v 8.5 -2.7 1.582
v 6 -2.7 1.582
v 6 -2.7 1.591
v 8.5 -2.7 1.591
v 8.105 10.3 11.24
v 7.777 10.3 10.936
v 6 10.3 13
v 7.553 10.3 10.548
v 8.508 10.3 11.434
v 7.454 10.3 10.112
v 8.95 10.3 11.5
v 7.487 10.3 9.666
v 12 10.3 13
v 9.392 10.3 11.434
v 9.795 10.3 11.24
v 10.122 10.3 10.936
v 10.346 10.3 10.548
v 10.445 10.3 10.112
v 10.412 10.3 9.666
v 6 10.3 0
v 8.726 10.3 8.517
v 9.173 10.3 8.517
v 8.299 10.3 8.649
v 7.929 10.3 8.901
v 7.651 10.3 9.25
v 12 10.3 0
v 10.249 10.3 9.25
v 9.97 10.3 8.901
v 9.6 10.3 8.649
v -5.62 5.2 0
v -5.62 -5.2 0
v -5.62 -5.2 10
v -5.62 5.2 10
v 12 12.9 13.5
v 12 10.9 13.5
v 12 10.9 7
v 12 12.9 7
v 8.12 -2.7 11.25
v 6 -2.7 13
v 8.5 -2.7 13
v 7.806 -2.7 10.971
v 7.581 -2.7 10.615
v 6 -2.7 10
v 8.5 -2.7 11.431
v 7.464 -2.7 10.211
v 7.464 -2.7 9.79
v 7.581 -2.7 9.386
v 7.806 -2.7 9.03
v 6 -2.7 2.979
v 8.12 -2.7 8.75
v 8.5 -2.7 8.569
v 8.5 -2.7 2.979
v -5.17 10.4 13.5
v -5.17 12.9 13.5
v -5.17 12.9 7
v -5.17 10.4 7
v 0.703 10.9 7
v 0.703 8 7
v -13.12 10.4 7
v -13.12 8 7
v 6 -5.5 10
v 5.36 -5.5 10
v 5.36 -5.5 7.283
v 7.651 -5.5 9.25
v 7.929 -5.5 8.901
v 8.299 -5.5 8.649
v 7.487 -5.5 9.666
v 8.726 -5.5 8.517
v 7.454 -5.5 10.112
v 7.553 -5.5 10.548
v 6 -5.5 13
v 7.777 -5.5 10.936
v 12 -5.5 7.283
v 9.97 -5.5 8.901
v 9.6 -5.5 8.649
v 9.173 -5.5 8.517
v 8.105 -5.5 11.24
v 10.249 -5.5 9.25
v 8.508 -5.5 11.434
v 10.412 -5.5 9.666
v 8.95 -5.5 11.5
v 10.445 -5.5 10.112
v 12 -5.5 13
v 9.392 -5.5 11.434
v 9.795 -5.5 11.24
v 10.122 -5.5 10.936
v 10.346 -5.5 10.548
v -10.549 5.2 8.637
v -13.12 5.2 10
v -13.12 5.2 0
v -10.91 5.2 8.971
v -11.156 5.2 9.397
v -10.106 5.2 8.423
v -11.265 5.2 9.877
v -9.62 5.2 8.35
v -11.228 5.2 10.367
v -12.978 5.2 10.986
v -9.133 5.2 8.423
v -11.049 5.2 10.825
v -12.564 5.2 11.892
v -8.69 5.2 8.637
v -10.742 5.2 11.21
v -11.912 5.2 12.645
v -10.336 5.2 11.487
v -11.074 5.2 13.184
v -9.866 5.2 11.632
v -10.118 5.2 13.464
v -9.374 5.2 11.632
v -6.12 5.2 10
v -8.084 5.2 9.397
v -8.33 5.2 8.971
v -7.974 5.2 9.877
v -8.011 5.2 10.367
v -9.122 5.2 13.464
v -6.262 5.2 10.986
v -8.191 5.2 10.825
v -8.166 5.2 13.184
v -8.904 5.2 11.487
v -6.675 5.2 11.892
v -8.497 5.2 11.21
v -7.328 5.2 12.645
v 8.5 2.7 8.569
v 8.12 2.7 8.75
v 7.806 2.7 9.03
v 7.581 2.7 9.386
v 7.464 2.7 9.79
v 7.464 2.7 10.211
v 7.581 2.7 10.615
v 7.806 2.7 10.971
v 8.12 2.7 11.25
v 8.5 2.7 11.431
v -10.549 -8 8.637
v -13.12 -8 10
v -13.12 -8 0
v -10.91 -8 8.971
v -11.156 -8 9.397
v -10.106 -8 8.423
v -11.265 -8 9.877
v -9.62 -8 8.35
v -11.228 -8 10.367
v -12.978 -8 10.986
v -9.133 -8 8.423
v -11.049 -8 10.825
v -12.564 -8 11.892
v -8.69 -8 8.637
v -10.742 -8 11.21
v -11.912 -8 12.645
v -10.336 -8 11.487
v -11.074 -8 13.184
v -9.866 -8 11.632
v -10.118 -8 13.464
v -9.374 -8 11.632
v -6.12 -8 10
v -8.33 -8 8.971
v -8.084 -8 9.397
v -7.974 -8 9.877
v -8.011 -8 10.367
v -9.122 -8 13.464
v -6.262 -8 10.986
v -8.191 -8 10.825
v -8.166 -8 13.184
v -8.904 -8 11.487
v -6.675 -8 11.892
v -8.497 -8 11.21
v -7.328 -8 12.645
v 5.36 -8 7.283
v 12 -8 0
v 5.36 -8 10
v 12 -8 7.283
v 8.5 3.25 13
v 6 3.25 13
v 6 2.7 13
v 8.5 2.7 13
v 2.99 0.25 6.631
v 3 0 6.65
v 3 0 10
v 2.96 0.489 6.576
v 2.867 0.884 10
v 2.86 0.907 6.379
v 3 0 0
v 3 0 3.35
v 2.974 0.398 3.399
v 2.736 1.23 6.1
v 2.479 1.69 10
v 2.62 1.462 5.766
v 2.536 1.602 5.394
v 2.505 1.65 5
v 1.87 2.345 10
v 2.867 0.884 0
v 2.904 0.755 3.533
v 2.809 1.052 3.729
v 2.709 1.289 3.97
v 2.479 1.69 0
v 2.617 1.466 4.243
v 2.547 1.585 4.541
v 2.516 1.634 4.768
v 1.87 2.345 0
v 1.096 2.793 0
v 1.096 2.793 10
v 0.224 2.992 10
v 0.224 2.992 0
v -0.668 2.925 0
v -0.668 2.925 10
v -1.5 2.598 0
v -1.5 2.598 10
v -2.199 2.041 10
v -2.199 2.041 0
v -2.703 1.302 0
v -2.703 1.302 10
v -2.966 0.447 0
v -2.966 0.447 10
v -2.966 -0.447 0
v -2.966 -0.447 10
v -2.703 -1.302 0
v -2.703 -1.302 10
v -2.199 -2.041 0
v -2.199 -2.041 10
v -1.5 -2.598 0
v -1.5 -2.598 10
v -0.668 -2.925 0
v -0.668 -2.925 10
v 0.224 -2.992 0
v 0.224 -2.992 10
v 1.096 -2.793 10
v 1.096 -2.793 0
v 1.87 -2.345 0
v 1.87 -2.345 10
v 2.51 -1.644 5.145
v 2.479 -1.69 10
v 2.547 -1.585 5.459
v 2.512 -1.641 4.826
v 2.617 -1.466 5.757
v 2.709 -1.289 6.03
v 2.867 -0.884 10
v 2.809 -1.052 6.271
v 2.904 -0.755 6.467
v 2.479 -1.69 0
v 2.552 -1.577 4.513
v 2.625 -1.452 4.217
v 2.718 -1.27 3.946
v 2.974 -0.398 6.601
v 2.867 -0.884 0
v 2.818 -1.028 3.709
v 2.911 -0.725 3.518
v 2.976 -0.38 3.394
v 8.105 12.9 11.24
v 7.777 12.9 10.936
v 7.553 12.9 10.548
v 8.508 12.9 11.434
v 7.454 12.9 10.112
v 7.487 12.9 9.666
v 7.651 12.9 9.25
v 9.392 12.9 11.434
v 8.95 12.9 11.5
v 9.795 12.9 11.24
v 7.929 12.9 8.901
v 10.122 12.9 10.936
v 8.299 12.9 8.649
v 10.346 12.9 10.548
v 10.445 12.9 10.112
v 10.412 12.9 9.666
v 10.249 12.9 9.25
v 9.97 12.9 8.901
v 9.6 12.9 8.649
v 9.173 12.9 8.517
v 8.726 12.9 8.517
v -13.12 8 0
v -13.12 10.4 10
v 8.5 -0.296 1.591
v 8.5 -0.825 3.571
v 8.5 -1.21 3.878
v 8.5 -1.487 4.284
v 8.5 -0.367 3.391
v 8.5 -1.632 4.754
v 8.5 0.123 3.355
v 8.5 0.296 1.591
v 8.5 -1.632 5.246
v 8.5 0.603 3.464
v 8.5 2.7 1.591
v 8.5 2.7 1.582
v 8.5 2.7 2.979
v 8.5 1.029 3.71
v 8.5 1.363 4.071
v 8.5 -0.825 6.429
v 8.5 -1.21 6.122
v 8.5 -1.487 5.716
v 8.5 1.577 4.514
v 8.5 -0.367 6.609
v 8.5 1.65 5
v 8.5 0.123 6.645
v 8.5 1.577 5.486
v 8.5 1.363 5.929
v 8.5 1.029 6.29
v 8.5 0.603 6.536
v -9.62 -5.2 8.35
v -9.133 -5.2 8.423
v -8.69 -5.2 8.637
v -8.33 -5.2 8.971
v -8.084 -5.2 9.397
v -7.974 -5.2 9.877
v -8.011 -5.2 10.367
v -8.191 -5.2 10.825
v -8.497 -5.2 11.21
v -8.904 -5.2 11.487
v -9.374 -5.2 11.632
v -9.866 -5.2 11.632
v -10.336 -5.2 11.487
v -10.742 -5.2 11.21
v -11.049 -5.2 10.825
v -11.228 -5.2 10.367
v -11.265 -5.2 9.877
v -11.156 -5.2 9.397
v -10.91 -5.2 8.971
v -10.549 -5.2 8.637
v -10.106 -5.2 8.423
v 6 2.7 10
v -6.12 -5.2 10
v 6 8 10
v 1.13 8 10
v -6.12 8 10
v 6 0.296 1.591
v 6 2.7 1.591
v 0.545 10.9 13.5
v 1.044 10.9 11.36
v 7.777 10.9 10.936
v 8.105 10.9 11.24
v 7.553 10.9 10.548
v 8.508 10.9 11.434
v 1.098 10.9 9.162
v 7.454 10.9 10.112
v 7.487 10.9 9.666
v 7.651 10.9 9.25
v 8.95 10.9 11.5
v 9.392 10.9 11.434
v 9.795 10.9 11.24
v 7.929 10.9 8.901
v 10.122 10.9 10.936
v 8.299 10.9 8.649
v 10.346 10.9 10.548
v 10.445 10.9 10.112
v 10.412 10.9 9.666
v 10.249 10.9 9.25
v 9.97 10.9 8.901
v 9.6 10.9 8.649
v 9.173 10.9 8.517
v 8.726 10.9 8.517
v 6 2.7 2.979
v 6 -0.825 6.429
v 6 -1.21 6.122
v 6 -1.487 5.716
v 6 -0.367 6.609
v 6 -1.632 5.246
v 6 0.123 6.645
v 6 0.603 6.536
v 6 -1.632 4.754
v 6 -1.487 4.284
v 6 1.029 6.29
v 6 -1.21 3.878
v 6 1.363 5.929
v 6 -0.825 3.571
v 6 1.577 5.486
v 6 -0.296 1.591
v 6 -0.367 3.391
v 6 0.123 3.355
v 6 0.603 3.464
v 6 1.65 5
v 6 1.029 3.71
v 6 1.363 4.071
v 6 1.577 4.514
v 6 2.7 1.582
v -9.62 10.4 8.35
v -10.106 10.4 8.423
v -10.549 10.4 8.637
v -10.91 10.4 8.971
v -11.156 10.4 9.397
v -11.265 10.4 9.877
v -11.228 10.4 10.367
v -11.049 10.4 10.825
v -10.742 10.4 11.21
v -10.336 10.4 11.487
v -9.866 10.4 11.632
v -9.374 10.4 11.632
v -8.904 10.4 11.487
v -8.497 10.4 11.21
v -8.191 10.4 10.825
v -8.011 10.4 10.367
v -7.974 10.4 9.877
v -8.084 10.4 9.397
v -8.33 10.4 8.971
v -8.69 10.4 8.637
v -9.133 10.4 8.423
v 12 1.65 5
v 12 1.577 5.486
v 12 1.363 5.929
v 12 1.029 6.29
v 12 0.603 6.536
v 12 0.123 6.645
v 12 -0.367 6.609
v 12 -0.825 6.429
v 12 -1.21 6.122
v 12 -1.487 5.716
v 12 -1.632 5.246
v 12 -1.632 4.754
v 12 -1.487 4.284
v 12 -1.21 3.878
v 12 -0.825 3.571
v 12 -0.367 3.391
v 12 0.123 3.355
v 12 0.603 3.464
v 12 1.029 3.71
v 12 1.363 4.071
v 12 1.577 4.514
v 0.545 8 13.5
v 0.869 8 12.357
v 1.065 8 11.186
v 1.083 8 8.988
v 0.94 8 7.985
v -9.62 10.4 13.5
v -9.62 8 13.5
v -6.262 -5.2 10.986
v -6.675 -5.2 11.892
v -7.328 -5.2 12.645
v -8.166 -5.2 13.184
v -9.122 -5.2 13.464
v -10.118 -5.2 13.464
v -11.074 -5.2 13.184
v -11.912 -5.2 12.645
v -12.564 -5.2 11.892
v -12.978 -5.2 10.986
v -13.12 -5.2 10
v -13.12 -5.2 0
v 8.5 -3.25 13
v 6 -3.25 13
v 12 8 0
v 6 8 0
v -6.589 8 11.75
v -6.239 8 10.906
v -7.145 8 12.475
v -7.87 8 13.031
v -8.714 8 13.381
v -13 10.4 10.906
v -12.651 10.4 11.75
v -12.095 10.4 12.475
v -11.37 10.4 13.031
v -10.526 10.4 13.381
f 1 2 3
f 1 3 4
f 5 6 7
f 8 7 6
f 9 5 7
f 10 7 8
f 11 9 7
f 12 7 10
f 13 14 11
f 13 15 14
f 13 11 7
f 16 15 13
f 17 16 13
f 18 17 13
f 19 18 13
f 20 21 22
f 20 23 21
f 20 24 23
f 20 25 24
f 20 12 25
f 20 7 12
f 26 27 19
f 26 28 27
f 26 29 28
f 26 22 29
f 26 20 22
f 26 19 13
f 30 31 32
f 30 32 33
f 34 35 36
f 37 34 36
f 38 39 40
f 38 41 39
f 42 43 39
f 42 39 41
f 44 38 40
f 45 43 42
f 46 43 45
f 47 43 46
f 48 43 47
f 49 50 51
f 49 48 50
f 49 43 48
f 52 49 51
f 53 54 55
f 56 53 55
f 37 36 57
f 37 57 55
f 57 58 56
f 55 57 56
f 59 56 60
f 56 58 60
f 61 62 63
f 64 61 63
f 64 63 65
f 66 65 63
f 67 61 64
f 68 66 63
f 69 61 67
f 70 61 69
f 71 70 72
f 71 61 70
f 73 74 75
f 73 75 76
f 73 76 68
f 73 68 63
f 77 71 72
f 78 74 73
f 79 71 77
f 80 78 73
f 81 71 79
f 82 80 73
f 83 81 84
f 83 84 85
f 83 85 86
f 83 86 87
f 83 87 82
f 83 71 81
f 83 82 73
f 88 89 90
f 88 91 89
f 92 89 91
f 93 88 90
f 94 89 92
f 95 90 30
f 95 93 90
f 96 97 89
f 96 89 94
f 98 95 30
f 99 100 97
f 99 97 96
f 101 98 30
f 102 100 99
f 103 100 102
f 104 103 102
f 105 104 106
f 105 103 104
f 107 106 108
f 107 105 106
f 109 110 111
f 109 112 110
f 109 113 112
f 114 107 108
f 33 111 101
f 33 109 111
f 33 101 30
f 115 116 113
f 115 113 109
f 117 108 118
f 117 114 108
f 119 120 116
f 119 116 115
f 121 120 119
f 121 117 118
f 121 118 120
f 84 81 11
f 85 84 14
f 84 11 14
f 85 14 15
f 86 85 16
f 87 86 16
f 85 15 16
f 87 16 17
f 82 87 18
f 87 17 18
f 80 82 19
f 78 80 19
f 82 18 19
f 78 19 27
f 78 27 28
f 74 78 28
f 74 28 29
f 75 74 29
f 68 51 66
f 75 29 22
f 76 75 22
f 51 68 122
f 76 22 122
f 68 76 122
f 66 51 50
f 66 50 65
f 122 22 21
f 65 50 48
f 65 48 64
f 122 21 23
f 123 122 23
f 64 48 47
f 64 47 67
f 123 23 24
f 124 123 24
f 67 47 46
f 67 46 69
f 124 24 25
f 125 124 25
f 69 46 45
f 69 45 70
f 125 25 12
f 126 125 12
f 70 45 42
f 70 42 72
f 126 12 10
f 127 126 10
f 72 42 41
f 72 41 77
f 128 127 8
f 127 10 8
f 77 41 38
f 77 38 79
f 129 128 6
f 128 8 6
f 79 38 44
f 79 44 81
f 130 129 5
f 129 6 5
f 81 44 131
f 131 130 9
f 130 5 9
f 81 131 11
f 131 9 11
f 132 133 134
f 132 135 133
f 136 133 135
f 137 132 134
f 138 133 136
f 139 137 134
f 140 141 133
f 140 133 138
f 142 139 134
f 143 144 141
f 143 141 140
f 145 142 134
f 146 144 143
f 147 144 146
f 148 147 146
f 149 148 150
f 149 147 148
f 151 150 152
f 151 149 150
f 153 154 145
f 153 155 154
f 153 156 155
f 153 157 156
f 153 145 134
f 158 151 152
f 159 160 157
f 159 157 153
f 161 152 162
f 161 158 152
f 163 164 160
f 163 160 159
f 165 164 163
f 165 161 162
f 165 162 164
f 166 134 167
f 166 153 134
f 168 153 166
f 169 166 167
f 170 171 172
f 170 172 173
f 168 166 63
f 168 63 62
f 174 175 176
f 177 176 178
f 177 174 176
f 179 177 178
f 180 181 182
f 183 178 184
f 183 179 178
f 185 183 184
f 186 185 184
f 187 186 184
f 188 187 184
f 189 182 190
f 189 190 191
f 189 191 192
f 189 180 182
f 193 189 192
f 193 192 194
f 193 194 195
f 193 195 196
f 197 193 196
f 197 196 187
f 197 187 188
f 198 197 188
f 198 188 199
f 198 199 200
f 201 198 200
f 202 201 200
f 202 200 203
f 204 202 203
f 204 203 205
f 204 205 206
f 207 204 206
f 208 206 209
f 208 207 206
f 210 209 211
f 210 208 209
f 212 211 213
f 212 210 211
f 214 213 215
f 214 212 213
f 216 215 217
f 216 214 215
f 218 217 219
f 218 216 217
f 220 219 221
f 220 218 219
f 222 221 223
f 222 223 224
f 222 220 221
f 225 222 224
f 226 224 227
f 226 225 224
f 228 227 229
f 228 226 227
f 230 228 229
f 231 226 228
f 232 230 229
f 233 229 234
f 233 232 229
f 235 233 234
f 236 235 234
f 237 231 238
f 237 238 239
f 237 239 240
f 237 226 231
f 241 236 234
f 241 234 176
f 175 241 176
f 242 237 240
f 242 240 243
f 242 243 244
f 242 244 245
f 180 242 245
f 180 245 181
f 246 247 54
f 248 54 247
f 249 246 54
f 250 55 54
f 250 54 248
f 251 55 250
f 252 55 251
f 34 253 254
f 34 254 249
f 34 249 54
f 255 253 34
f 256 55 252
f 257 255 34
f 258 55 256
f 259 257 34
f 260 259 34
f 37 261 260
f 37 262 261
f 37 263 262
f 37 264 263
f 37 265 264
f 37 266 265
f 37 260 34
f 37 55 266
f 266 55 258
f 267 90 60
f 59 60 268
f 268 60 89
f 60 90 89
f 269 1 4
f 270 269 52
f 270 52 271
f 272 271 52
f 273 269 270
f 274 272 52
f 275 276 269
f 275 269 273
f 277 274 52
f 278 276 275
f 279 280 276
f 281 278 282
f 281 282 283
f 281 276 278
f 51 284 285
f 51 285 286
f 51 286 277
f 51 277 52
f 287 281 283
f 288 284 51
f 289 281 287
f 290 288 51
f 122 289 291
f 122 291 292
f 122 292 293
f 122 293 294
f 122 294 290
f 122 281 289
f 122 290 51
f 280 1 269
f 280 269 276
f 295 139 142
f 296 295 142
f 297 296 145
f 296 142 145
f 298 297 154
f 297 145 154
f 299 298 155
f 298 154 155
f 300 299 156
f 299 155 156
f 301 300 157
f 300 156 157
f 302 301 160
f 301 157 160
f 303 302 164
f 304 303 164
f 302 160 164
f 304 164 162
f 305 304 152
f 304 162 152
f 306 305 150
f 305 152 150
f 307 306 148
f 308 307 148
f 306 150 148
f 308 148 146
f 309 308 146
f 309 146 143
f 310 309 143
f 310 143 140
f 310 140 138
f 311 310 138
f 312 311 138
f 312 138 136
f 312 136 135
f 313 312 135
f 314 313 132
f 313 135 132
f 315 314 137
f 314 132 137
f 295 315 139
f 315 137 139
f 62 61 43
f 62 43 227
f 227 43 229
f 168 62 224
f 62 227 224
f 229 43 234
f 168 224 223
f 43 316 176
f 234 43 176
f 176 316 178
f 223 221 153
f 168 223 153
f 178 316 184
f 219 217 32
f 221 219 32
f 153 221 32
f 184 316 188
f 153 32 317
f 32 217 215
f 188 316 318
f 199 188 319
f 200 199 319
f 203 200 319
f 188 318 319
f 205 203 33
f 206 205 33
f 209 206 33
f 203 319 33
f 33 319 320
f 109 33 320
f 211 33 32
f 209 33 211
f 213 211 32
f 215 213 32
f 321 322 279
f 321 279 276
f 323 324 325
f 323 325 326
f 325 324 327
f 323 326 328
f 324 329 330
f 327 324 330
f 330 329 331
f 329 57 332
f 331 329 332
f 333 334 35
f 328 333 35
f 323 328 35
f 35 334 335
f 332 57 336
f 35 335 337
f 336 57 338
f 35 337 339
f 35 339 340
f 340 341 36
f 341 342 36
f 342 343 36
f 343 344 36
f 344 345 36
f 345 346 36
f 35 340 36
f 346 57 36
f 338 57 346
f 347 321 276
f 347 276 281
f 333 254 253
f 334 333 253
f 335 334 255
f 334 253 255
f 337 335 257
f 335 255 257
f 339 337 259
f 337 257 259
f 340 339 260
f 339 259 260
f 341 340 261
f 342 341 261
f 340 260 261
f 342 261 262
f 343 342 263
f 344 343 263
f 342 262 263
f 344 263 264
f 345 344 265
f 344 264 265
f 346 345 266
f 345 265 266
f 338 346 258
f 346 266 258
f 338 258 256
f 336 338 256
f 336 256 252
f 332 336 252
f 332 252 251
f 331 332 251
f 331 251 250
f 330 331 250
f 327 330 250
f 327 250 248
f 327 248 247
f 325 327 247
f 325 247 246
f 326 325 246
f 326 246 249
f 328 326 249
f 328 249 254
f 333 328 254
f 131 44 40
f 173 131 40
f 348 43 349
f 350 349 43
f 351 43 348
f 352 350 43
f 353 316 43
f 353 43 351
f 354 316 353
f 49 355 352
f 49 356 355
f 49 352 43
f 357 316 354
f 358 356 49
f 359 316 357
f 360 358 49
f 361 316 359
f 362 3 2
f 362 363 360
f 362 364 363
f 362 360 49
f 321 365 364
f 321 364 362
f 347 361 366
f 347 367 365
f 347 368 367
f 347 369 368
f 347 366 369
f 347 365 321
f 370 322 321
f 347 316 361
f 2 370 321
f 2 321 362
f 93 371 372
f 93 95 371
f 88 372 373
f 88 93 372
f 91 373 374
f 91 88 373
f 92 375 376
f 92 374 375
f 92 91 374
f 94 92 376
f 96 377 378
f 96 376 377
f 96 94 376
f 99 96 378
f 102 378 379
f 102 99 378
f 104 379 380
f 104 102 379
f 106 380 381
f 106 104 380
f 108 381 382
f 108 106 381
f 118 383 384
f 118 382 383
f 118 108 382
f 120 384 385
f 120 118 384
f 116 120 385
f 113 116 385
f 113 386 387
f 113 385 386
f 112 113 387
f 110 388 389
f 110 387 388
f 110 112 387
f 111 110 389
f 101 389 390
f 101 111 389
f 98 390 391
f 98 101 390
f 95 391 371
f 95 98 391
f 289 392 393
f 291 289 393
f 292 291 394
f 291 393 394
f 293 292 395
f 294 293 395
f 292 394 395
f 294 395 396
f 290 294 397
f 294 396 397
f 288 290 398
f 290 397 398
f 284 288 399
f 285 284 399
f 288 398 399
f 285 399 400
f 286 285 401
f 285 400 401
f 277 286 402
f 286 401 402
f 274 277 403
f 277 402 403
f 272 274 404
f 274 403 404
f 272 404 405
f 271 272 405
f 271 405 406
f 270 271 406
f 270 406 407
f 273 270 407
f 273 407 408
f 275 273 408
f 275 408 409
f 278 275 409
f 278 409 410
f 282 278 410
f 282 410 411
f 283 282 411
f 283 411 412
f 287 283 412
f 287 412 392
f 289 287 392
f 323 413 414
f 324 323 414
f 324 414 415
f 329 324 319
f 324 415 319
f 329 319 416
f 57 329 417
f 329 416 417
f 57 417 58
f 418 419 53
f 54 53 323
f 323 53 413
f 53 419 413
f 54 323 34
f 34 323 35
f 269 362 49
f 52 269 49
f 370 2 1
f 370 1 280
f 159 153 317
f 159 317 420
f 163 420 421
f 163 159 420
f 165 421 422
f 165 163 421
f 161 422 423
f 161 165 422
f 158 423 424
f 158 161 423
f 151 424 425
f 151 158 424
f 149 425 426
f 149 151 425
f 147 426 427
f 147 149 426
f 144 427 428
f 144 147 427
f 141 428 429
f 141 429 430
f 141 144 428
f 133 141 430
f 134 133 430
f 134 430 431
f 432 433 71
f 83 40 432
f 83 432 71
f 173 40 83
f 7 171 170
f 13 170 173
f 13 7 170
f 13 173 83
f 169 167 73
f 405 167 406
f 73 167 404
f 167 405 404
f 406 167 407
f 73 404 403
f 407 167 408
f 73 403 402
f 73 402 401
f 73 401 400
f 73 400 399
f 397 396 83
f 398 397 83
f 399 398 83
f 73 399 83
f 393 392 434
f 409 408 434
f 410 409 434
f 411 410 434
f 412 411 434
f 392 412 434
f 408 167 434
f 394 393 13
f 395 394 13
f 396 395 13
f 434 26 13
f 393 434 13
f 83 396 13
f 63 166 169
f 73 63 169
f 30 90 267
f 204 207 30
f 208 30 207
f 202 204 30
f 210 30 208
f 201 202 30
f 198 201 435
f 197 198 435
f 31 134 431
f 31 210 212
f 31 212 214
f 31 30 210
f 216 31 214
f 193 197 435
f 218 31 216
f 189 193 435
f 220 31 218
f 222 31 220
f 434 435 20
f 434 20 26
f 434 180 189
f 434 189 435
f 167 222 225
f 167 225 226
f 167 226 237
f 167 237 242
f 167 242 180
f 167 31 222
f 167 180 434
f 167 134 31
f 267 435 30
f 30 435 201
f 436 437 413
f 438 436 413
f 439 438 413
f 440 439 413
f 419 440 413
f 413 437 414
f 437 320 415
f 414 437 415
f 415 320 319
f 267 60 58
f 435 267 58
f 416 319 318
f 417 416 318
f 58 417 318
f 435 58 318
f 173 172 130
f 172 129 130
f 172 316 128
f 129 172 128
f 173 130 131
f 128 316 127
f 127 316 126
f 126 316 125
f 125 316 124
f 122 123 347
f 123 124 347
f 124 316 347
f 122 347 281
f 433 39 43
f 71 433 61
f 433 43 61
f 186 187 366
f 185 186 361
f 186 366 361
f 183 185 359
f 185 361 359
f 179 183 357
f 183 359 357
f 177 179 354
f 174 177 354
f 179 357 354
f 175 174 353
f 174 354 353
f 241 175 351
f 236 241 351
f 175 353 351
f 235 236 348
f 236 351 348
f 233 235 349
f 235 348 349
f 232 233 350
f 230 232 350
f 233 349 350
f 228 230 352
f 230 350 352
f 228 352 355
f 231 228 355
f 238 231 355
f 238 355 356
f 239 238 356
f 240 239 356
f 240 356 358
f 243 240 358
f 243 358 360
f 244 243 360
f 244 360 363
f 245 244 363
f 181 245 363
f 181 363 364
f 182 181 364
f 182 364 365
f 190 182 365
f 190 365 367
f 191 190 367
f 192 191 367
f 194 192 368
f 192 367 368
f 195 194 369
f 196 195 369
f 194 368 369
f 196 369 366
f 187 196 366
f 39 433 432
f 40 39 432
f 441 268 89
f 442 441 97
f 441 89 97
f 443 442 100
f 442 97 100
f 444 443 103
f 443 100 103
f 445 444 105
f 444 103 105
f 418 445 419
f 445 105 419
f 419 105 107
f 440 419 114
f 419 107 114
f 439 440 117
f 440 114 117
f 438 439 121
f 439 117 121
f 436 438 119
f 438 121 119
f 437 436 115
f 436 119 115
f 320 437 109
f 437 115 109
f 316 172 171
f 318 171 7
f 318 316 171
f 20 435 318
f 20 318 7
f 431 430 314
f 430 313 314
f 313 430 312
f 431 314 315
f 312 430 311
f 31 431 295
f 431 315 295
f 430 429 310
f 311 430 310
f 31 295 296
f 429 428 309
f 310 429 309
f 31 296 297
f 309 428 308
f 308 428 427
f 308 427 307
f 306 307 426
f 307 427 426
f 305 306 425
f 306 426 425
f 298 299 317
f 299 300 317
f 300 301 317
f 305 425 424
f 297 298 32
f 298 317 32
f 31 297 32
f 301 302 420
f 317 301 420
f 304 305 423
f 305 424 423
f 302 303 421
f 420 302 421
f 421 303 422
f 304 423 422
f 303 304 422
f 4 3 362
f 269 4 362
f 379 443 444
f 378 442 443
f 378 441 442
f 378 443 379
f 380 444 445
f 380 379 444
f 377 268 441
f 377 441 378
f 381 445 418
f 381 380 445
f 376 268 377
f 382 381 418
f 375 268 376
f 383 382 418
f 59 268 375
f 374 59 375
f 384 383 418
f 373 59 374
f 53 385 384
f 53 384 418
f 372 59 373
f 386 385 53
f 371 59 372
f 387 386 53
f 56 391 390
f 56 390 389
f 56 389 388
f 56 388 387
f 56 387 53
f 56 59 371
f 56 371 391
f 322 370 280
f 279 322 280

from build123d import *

# Parameters (mm, degrees)
SZKIC2_W                     = 17.619731325
SZKIC2_H                     = 16
SZKIC2_R                     = 3
DODANIE_WYCI_GNI_CIE1_DEPTH  = 10
SZKIC3_R                     = 1.65
WYTNIJ_WYCI_GNI_CIE1_DEPTH   = 10
WYTNIJ_WYCI_GNI_CIE2_DEPTH   = 2.5
DODANIE_WYCI_GNI_CIE2_DEPTH  = 2.5
SZKIC7_R                     = 1.65
DODANIE_WYCI_GNI_CIE4_DEPTH  = 2.8
SZKIC10_R                    = 1.65
DODANIE_WYCI_GNI_CIE5_DEPTH  = 2.9
SZKIC11_R                    = 1.65
DODANIE_WYCI_GNI_CIE6_DEPTH  = 2
SZKIC12_W                    = 6
SZKIC12_H                    = 13
DODANIE_WYCI_GNI_CIE7_DEPTH  = 2.3
SZKIC16_W                    = 6
SZKIC16_H                    = 3
DODANIE_WYCI_GNI_CIE12_DEPTH = 4.75
SZKIC17_W                    = 3.5
SZKIC17_H                    = 3
DODANIE_WYCI_GNI_CIE13_DEPTH = 6.5
SZKIC18_W                    = 6
SZKIC18_H                    = 3.354251662
DODANIE_WYCI_GNI_CIE14_DEPTH = 4.75
WYTNIJ_WYCI_GNI_CIE3_REACH   = 30.128
SZKIC19_R                    = 1.181229449
SZKIC21_W                    = 2.5
SZKIC21_H                    = 0.556642191
DODANIE_WYCI_GNI_CIE15_DEPTH = 11.418457
WYTNIJ_WYCI_GNI_CIE4_START   = -18.3
SZKIC22_R                    = 1.181229449
WYTNIJ_WYCI_GNI_CIE4_DEPTH   = 18.3
SZKIC34_W                    = 7.949380073
SZKIC34_H                    = 6.5
WYTNIJ_WYCI_GNI_CIE5_DEPTH   = 2.5
SZKIC35_W                    = 6.6400164
SZKIC35_H                    = 5.717036495
WYTNIJ_WYCI_GNI_CIE6_DEPTH   = 2.5
SZKIC36_R                    = 1.5
WYTNIJ_WYCI_GNI_CIE7_DEPTH   = 21


with BuildPart() as part:
    # Szkic2 → Dodanie-wyciągnięcie1 (new body)
    with BuildSketch(Plane.XY):
        with Locations((3.190134337, 0)):
            Rectangle(SZKIC2_W, SZKIC2_H)
        Circle(SZKIC2_R, mode=Mode.SUBTRACT)
    extrude(amount=DODANIE_WYCI_GNI_CIE1_DEPTH)

    # Szkic3 → Wytnij-wyciągnięcie1 (cut)
    with BuildSketch(Plane(origin=(12, 0, 0), x_dir=(0, 0, -1), z_dir=(1, 0, 0))):
        with Locations(Location((-5, 0, 0), (0, 0, 90))):
            Circle(SZKIC3_R)
    extrude(amount=-WYTNIJ_WYCI_GNI_CIE1_DEPTH, mode=Mode.SUBTRACT)

    # Szkic5 → Wytnij-wyciągnięcie2 (cut)
    with BuildSketch(Plane(origin=(6, 0, 0), x_dir=(0, 0, -1), z_dir=(1, 0, 0))):
        Polygon((-8.418457275, 3.25), (-10, 3.25), (-10, -3.25), (-8.418457275, -3.25), (-1.581542725, -3.25), (-1.581542725, 3.25), align=None)
    extrude(amount=WYTNIJ_WYCI_GNI_CIE2_DEPTH, mode=Mode.SUBTRACT)

    # Szkic6 → Dodanie-wyciągnięcie2 (add)
    with BuildSketch(Plane(origin=(6, 0, 0), x_dir=(0, 0, -1), z_dir=(1, 0, 0))):
        Polygon((-1.591079408, 3.256272654), (-1.591079408, 0.295576336), (-3.210214166, 3.1), (-3.210214166, 3.256272654), align=None)
    dodanie_wyci_gni_cie2 = extrude(amount=DODANIE_WYCI_GNI_CIE2_DEPTH)

    # Lustro1: Dodanie-wyciągnięcie2 across plane
    add(dodanie_wyci_gni_cie2.mirror(Plane.ZX))

    # Szkic7 → Dodanie-wyciągnięcie4 (add)
    with BuildSketch(Plane.XZ.offset(8)):
        with BuildLine():
            Line((-13.119731325, 10), (-13.119731325, 0))
            Line((-13.119731325, 0), (-5.619731325, 0))
            Line((-5.619731325, 0), (-5.619731325, 10))
            Line((-5.619731325, 10), (-6.119731325, 10))
            ThreePointArc((-6.119731325, 10), (-9.619731325, 13.5), (-13.119731325, 10))
        make_face()
        with Locations(Location((-9.619731325, 10, 0), (0, 0, 270))):
            Circle(SZKIC7_R, mode=Mode.SUBTRACT)
    dodanie_wyci_gni_cie4 = extrude(amount=-DODANIE_WYCI_GNI_CIE4_DEPTH)

    # Lustro2: Dodanie-wyciągnięcie4 across plane
    add(dodanie_wyci_gni_cie4.mirror(Plane.ZX))

    # Szkic10 → Dodanie-wyciągnięcie5 (add)
    with BuildSketch(Plane(origin=(0, 8, 0), x_dir=(1, 0, 0), z_dir=(0, 1, 0))):
        with BuildLine():
            Line((-6.119731325, -13.5), (0.54454435, -13.5))
            ThreePointArc((0.54454435, -13.5), (1.127068602, -10.262281002), (0.703180086, -7))
            Line((0.703180086, -7), (-6.119731325, -7))
            Line((-6.119731325, -7), (-13.119731325, -7))
            Line((-13.119731325, -7), (-13.119731325, -10))
            ThreePointArc((-13.119731325, -10), (-12.094605059, -12.474873734), (-9.619731325, -13.5))
            Line((-9.619731325, -13.5), (-6.119731325, -13.5))
        make_face()
        with Locations(Location((-9.619731325, -10, 0), (0, 0, 90))):
            Circle(SZKIC10_R, mode=Mode.SUBTRACT)
    extrude(amount=DODANIE_WYCI_GNI_CIE5_DEPTH)

    # Szkic11 → Dodanie-wyciągnięcie6 (add)
    with BuildSketch(Plane(origin=(0, 10.9, 0), x_dir=(1, 0, 0), z_dir=(0, 1, 0))):
        with BuildLine():
            Line((12, -7), (-13.119731325, -7))
            Line((-13.119731325, -7), (-13.119731325, -10))
            ThreePointArc((-13.119731325, -10), (-12.094605059, -12.474873734), (-9.619731325, -13.5))
            Line((-9.619731325, -13.5), (12, -13.5))
            Line((12, -13.5), (12, -7))
        make_face()
        with Locations(Location((-9.619731325, -10, 0), (0, 0, 90))):
            Circle(SZKIC11_R, mode=Mode.SUBTRACT)
    extrude(amount=DODANIE_WYCI_GNI_CIE6_DEPTH)

    # Szkic12 → Dodanie-wyciągnięcie7 (add)
    with BuildSketch(Plane(origin=(0, 8, 0), x_dir=(1, 0, 0), z_dir=(0, 1, 0))):
        with Locations((9, -6.5)):
            Rectangle(SZKIC12_W, SZKIC12_H)
    extrude(amount=DODANIE_WYCI_GNI_CIE7_DEPTH)

    # Szkic16 → Dodanie-wyciągnięcie12 (add)
    with BuildSketch(Plane.XZ.offset(-8)):
        with Locations((9, 11.5)):
            Rectangle(SZKIC16_W, SZKIC16_H)
    extrude(amount=DODANIE_WYCI_GNI_CIE12_DEPTH)

    # Szkic17 → Dodanie-wyciągnięcie13 (add)
    with BuildSketch(Plane.XZ.offset(-3.25)):
        with Locations((10.25, 11.5)):
            Rectangle(SZKIC17_W, SZKIC17_H)
    extrude(amount=DODANIE_WYCI_GNI_CIE13_DEPTH)

    # Szkic18 → Dodanie-wyciągnięcie14 (add)
    with BuildSketch(Plane.XZ.offset(3.25)):
        with Locations((9, 11.322874169)):
            Rectangle(SZKIC18_W, SZKIC18_H)
    extrude(amount=DODANIE_WYCI_GNI_CIE14_DEPTH)

    # Wytnij-wyciągnięcie3: up to this face of the body (flat: up to its plane)
    wytnij_wyci_gni_cie3_end = Plane(part.part.faces().sort_by_distance((-0.291063064, -8, 5.711108324))[0])
    # Szkic19 → Wytnij-wyciągnięcie3 (cut, up to the picked face)
    with BuildSketch(Plane(origin=(0, 12.9, 0), x_dir=(1, 0, 0), z_dir=(0, 1, 0)), mode=Mode.PRIVATE) as wytnij_wyci_gni_cie3_sk1:
        with Locations(Location((9, -10, 0), (0, 0, 270))):
            Circle(SZKIC19_R)
    wytnij_wyci_gni_cie3_tool1 = split(extrude(wytnij_wyci_gni_cie3_sk1.sketch, amount=-WYTNIJ_WYCI_GNI_CIE3_REACH, mode=Mode.PRIVATE), bisect_by=wytnij_wyci_gni_cie3_end, keep=Keep.BOTH, mode=Mode.PRIVATE)
    add(wytnij_wyci_gni_cie3_tool1.solids().sort_by(Axis((9, 12.9, 10), (0, -1, 0)))[0], mode=Mode.SUBTRACT)

    # Szkic21 → Dodanie-wyciągnięcie15 (add)
    with BuildSketch(Plane.XY.offset(1.581542725)):
        with Locations((7.25, 2.978321096)):
            Rectangle(SZKIC21_W, SZKIC21_H)
    dodanie_wyci_gni_cie15 = extrude(amount=DODANIE_WYCI_GNI_CIE15_DEPTH)

    # Lustro3: Dodanie-wyciągnięcie15 across plane
    add(dodanie_wyci_gni_cie15.mirror(Plane.ZX))

    # Szkic22 → Wytnij-wyciągnięcie4 (cut)
    with BuildSketch(Plane.XZ.offset(8).offset(WYTNIJ_WYCI_GNI_CIE4_START)):
        with Locations(Location((9, 10, 0), (0, 0, 90))):
            Circle(SZKIC22_R)
    extrude(amount=WYTNIJ_WYCI_GNI_CIE4_DEPTH, mode=Mode.SUBTRACT)

    # Szkic34 → Wytnij-wyciągnięcie5 (cut)
    with BuildSketch(Plane(origin=(0, 12.9, 0), x_dir=(1, 0, 0), z_dir=(0, 1, 0))):
        with Locations((-9.145041288, -10.25)):
            Rectangle(SZKIC34_W, SZKIC34_H)
    extrude(amount=-WYTNIJ_WYCI_GNI_CIE5_DEPTH, mode=Mode.SUBTRACT)

    # Szkic35 → Wytnij-wyciągnięcie6 (cut)
    with BuildSketch(Plane.XZ.offset(8)):
        with Locations((8.6799918, 10.141481753)):
            Rectangle(SZKIC35_W, SZKIC35_H)
    extrude(amount=-WYTNIJ_WYCI_GNI_CIE6_DEPTH, mode=Mode.SUBTRACT)

    # Szkic36 → Wytnij-wyciągnięcie7 (cut)
    with BuildSketch(Plane(origin=(0, 15, 0), x_dir=(1, 0, 0), z_dir=(0, 1, 0))):
        with Locations(Location((8.94965168, -10.000267868, 0), (0, 0, 270))):
            Circle(SZKIC36_R)
    extrude(amount=-WYTNIJ_WYCI_GNI_CIE7_DEPTH, mode=Mode.SUBTRACT)


solid = part.part
